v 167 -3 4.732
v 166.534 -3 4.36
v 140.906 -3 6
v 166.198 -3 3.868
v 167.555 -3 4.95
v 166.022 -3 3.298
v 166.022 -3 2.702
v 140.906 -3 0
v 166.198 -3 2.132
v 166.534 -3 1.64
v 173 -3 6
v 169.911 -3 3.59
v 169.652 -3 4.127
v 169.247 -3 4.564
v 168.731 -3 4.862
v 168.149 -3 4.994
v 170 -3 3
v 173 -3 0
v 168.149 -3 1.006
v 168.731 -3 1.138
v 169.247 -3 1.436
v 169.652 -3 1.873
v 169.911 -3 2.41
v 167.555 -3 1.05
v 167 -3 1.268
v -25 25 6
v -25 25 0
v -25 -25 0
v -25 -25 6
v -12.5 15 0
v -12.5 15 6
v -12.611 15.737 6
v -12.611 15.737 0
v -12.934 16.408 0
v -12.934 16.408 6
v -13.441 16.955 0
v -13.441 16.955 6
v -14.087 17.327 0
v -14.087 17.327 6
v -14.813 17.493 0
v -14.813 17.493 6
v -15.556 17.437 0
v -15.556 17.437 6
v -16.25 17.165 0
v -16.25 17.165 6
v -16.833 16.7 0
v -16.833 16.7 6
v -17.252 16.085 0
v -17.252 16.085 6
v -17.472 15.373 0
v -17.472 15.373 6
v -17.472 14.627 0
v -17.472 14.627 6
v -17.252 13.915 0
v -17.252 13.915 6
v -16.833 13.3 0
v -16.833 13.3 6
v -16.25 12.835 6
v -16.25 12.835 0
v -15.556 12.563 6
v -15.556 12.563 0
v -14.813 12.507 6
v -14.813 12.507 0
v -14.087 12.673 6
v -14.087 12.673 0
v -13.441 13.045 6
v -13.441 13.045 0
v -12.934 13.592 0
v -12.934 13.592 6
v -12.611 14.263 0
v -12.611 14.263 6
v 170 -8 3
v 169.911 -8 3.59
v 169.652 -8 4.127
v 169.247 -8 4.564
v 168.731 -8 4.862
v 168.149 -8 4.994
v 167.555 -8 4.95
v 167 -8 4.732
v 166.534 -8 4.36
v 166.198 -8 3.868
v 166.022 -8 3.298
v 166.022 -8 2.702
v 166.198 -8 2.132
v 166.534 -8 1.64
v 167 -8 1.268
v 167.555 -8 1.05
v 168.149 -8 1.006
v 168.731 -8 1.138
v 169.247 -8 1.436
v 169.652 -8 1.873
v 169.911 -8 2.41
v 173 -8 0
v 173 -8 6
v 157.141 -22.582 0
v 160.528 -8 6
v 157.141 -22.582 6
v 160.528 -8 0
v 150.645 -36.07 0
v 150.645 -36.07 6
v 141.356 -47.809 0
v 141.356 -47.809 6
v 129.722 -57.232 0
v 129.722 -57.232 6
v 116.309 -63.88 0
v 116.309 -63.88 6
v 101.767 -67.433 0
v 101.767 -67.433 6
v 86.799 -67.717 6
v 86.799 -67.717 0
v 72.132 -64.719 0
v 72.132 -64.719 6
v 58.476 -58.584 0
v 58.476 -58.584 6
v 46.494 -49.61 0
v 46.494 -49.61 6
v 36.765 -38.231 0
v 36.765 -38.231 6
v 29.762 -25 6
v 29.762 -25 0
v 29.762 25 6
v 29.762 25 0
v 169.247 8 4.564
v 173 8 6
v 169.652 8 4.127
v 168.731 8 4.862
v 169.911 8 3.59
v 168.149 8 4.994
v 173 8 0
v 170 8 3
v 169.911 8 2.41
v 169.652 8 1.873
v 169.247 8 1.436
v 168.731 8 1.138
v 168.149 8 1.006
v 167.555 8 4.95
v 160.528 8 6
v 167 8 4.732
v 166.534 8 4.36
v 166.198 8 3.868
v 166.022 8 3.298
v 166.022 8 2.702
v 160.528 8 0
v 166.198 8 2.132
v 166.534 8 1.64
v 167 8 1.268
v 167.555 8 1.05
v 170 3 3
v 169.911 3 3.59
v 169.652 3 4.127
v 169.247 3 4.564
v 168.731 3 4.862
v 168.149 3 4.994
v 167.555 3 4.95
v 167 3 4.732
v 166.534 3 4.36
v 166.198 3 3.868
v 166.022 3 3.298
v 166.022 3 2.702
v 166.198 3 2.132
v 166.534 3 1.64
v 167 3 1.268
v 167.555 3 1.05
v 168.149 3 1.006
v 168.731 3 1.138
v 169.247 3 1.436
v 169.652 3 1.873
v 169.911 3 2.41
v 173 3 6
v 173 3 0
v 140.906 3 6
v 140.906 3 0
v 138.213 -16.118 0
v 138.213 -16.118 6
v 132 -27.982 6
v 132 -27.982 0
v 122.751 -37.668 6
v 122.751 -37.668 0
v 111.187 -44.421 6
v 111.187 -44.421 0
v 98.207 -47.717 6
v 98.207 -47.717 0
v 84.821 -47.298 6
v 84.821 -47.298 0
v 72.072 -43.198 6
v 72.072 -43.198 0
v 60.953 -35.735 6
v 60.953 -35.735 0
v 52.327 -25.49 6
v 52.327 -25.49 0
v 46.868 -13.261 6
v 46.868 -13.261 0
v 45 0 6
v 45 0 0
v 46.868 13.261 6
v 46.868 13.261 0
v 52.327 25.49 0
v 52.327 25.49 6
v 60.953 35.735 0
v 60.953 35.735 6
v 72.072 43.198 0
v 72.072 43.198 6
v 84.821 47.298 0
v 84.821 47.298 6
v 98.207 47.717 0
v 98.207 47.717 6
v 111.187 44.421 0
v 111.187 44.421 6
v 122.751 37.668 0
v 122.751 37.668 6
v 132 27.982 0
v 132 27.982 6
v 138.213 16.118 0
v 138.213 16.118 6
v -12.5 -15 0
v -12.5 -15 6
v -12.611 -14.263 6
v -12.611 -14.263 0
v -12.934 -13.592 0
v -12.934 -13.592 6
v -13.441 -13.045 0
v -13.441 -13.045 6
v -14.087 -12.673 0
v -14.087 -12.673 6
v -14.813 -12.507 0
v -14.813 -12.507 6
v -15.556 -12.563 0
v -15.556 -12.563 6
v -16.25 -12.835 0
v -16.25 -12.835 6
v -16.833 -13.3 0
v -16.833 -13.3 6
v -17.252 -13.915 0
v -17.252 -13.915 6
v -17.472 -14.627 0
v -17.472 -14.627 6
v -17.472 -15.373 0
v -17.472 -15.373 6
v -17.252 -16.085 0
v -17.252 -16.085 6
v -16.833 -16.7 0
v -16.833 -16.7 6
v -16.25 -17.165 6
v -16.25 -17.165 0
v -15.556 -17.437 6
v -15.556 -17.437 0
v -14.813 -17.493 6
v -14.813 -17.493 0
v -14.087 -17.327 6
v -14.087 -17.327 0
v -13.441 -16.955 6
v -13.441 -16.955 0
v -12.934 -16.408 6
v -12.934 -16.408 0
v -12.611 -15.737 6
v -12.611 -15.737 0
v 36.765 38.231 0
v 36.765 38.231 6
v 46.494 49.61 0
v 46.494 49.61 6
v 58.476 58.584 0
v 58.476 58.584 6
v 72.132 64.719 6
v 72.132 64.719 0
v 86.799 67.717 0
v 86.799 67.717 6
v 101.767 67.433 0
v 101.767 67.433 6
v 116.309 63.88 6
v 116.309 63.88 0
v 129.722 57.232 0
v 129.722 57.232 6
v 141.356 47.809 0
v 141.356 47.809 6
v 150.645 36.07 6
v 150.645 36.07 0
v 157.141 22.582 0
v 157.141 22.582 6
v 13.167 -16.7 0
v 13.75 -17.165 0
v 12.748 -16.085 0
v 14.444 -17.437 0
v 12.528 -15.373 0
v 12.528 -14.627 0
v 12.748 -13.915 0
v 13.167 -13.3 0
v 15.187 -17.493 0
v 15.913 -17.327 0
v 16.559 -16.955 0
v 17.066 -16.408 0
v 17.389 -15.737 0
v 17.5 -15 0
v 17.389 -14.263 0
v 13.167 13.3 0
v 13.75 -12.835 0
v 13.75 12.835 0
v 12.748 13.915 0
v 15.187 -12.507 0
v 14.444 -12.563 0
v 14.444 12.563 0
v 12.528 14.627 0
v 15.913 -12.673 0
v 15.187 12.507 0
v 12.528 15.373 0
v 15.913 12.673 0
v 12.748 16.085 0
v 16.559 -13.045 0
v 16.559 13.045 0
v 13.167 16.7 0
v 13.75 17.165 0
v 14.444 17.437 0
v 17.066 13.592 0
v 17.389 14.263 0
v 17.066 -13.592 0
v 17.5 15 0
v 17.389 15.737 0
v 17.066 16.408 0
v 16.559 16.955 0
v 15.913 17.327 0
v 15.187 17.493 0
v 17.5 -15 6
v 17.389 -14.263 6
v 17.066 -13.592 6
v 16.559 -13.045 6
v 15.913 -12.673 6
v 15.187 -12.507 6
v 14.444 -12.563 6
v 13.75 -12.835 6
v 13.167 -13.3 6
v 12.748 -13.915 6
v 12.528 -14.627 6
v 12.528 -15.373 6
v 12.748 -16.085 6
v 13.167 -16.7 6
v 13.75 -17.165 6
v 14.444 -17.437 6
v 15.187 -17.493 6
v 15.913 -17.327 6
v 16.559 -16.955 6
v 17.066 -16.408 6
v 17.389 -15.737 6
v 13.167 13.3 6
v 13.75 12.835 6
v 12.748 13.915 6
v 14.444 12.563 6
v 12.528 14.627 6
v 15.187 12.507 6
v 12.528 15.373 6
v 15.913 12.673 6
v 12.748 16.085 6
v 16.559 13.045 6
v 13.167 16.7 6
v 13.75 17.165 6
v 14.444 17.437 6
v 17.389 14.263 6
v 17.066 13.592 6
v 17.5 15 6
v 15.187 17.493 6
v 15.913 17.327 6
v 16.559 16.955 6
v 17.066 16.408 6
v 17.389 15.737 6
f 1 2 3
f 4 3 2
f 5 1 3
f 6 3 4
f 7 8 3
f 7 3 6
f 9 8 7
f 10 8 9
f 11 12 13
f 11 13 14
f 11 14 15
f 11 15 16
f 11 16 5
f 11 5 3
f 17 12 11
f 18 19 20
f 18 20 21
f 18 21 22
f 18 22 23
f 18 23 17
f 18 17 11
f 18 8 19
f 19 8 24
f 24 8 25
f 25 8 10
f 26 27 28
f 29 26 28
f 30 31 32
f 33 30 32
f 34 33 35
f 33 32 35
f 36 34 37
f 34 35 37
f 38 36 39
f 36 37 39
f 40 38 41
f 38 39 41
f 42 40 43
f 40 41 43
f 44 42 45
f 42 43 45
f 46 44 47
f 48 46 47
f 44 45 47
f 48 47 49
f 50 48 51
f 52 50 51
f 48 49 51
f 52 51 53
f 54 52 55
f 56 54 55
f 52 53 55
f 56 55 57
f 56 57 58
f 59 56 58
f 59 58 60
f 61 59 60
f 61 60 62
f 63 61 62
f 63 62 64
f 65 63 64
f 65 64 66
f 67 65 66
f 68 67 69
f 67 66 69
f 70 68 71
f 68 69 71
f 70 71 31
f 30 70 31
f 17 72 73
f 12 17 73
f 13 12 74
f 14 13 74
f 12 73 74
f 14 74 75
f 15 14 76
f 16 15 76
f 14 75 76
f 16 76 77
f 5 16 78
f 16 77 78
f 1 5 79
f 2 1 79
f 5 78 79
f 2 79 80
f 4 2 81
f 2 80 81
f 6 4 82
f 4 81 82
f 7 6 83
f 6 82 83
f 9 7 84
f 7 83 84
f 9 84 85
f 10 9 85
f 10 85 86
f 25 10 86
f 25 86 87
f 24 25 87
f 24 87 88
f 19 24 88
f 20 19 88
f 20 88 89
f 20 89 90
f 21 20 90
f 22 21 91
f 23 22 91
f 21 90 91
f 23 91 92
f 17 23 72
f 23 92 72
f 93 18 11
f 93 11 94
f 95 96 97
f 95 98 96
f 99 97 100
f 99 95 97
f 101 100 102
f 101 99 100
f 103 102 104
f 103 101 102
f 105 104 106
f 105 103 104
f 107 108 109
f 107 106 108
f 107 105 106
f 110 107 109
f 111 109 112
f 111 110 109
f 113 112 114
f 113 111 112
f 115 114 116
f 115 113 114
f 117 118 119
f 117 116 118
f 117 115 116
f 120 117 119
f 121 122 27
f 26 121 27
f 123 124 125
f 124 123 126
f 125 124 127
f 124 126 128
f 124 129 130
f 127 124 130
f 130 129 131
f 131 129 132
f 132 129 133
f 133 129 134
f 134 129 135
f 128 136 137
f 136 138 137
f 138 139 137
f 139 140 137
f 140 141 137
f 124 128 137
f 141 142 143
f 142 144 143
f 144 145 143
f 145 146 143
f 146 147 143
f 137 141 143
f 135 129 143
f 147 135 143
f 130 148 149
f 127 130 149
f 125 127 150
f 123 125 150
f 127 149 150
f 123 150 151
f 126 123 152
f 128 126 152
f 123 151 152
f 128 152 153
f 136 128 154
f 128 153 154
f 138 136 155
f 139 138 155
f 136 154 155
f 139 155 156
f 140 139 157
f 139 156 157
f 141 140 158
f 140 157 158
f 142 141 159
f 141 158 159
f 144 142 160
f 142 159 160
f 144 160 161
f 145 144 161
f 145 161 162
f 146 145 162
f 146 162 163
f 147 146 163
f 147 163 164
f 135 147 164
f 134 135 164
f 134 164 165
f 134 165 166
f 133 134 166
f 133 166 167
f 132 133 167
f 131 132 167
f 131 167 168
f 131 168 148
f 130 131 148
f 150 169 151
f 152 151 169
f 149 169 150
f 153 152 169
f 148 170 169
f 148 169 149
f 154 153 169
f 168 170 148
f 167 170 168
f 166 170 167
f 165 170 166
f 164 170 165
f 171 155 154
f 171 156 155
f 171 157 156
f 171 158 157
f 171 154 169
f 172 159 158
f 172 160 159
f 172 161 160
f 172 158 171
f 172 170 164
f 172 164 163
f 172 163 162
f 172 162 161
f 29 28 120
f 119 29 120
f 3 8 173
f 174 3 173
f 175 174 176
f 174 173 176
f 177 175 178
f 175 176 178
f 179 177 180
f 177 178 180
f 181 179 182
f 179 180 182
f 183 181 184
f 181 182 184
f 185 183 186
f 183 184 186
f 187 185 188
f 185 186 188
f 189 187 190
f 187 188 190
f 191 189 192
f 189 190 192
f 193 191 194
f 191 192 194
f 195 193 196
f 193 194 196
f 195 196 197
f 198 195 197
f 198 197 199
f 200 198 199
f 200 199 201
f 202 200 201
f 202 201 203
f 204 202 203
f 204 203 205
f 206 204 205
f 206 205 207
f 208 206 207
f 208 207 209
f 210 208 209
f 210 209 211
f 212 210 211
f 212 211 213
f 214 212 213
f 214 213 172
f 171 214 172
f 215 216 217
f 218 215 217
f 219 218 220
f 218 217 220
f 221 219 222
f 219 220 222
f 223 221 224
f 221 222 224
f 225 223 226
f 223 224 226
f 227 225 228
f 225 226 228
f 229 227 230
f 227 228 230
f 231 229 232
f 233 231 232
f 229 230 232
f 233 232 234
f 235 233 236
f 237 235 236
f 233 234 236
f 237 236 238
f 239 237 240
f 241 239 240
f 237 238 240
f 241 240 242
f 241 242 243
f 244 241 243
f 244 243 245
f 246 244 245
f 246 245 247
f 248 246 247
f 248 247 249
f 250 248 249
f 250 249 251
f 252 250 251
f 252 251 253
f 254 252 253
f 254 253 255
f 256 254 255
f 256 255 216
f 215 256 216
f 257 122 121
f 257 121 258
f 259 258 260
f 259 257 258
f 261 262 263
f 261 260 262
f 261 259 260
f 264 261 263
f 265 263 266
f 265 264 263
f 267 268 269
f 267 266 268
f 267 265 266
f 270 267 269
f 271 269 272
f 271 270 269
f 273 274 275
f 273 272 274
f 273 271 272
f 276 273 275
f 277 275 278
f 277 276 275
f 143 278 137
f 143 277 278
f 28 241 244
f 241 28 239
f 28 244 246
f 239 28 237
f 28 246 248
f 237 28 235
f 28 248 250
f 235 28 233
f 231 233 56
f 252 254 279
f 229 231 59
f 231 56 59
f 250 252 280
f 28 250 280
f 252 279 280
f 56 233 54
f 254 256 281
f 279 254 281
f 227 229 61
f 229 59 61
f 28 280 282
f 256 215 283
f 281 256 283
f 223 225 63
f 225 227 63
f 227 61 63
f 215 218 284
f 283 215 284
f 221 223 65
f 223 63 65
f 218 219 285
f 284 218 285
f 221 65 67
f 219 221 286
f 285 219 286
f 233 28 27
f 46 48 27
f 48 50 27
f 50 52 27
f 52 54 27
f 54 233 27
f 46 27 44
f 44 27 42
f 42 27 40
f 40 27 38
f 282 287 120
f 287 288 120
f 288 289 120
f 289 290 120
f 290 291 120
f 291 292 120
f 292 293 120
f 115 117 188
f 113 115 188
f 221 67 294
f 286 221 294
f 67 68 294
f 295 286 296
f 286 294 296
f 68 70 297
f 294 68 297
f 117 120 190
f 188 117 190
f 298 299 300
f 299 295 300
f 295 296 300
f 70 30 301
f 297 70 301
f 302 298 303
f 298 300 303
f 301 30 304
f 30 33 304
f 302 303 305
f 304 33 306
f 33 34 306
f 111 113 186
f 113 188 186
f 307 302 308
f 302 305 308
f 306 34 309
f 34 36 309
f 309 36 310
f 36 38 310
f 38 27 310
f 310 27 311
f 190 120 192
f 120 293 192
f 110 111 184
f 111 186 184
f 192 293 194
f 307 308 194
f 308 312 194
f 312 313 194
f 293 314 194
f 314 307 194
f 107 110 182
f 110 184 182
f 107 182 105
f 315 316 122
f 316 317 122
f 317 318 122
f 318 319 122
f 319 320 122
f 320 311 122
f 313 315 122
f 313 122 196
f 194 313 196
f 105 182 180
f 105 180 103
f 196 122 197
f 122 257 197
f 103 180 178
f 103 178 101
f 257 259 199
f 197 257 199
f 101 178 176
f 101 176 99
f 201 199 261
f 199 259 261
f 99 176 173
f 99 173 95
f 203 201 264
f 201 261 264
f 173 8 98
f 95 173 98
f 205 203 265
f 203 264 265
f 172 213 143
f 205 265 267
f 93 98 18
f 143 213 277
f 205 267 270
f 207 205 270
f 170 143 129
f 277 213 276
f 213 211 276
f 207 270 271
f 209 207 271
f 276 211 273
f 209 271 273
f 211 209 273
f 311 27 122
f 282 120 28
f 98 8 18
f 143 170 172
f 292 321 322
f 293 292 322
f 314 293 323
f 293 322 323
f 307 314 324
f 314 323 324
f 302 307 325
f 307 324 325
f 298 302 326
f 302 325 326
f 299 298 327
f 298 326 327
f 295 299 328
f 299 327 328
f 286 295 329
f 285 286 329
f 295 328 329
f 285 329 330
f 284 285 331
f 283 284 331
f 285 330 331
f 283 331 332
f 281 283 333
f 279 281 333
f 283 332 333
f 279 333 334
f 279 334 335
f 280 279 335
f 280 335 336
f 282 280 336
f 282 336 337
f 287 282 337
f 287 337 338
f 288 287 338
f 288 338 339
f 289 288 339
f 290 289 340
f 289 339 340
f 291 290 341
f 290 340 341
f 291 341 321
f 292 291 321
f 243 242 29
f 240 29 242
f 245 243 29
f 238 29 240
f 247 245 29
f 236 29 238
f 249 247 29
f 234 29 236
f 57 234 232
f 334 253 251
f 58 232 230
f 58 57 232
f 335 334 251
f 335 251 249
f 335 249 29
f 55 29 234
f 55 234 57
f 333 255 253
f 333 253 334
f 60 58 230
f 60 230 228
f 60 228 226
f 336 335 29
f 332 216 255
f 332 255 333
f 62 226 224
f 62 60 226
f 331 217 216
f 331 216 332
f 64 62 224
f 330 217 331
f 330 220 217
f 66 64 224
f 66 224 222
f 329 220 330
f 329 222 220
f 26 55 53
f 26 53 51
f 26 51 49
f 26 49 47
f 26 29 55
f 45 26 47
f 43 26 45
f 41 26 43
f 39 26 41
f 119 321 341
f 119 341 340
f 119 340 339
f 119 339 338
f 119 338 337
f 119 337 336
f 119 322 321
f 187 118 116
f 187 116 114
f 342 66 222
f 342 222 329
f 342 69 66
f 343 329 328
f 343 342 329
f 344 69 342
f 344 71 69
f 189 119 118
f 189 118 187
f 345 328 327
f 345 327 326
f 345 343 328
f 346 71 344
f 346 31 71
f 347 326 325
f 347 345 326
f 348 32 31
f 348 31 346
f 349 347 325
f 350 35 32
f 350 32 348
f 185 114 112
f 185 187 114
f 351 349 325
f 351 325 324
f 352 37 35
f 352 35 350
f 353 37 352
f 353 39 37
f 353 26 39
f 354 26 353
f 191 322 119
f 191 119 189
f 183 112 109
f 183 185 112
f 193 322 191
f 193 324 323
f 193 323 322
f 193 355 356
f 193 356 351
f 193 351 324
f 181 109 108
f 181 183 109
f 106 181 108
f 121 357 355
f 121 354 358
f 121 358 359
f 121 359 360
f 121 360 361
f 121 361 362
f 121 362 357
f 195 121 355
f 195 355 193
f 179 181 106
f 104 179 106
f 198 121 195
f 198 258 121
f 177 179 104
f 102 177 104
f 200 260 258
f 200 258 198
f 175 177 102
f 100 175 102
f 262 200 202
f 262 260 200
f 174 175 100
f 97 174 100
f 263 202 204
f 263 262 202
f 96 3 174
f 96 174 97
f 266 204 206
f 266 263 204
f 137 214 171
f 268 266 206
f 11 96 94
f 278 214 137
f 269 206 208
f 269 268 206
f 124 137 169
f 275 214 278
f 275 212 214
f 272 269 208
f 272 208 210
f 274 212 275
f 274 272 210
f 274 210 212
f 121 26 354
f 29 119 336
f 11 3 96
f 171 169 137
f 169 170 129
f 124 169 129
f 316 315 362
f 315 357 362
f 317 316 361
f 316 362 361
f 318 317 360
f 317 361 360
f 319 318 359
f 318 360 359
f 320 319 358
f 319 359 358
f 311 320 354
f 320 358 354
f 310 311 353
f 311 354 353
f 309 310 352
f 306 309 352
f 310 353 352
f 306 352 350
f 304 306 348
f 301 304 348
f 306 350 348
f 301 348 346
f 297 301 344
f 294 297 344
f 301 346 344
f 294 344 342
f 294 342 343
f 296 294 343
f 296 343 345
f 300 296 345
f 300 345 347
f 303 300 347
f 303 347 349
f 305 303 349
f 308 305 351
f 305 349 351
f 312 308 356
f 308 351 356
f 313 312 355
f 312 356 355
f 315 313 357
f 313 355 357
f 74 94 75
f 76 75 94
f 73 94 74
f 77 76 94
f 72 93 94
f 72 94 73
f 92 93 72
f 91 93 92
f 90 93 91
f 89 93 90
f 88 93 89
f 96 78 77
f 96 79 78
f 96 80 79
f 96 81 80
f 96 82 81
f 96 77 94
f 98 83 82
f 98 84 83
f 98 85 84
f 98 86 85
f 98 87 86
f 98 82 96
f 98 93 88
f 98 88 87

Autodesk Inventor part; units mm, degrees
ref_plane "YZ Plane" through (0, 0, 0) normal (1, 0, 0) x (0, 1, 0)
ref_plane "XZ Plane" through (0, 0, 0) normal (0, 1, 0) x (-1, 0, 0)
ref_plane "XY Plane" through (0, 0, 0) normal (0, 0, 1) x (1, 0, 0)
sketch "スケッチ2" plane through (0, 0, 0) normal (0, 0, 1) x (1, 0, 0)
  line L0 (0, -106.3056) -> (0, 106.3056) projected
  line L1 (-64.6, 0) -> (212.6, 0) projected
  arc A0 (140.9062, 3) -> (140.9062, -3) centre (93, 0) ccw
  line L2 (-25, -25) -> (25, -25)
  line L3 (25, 25) -> (-25, 25)
  line L4 (-25, -25) -> (25, 25) construction
  line L5 (25, -25) -> (-25, 25) construction
  line L6 (25, 25) -> (29.7624, 25)
  line L7 (25, -25) -> (29.7624, -25)
  line L8 (140.9062, -3) -> (173, -3)
  line L9 (173, 3) -> (140.9062, 3)
  line L10 (145.3369, -0.7898) -> (173, 3) construction
  line L11 (173, -3) -> (145.3176, 0.7925) construction
  arc A1 (29.7624, -25) -> (160.5278, -8) centre (93, 0) ccw
  arc A2 (160.5278, 8) -> (29.7624, 25) centre (93, 0) ccw
  line L12 (173, 3) -> (173, 8)
  line L13 (173, 8) -> (160.5278, 8)
  line L14 (173, -3) -> (173, -8)
  line L15 (173, -8) -> (160.5278, -8)
  line L16 (-25, 25) -> (-25, -25)
  point P0 (0, 0)
  point P1 (151.102, 0)
  dimension "d1" = 96
  dimension "d2" = 50
  dimension "d7" = 5
  dimension "d8" = 3
  dimension "d9" = 5
  dimension "d10" = 80
  dimension "d12" = 20
  dimension "d13" = 93
  dimension "d15" = 20
  dimension "d16" = 50
  dimension "d17" = 3
  dimension "d18" = 50
extrude "押し出し1" add sketch "スケッチ2" along normal blind 6
sketch "スケッチ3" plane through (0, 0, 6) normal (0, 0, 1) x (1, 0, 0)
  line L0 (15, -15) -> (-15, -15)
  line L1 (-15, -15) -> (-15, 15)
  line L2 (-15, 15) -> (15, 15)
  line L3 (15, 15) -> (15, -15)
  line L4 (15, -15) -> (-15, 15) construction
  line L5 (-15, -15) -> (15, 15) construction
  circle A0 centre (-15, -15) radius 2.5
  circle A1 centre (-15, 15) radius 2.5
  line L6 (-15, 15) -> (-15, 45)
  circle A2 centre (15, -15) radius 2.5
  circle A3 centre (15, 15) radius 2.5
  point P0 (0, 0)
  dimension "d21" = 30
  dimension "d22" = 30
  dimension "d23" = 5
  dimension "d26" = 30
  dimension "d33" = 30
extrude "押し出し2" cut sketch "スケッチ3" against normal blind 6 contours A0 L1 L0 | L0 L1 A0 | A2 L3 L0 | L0 L3 A2 | A1 L6 L1 | L1 L2 A1 | A3 L2 L3 | L3 L2 A3 | L6 A1 L2
sketch "スケッチ4" plane through (160.5278, -8, 0) normal (0, -1, 0) x (1, 0, 0)
  circle A0 centre (7.4722, 3) radius 2
  line L0 (0, 0) -> (12.4722, 0) projected
  line L1 (12.4722, 0) -> (12.4722, 6) projected
  point P0 (-160.5278, 0)
  dimension "d40" = 3
  dimension "d41" = 4
  dimension "d42" = 5
extrude "押し出し3" cut sketch "スケッチ4" against normal through all
properties part number "motor_hold_sample" material "アルミニウム 6061"
